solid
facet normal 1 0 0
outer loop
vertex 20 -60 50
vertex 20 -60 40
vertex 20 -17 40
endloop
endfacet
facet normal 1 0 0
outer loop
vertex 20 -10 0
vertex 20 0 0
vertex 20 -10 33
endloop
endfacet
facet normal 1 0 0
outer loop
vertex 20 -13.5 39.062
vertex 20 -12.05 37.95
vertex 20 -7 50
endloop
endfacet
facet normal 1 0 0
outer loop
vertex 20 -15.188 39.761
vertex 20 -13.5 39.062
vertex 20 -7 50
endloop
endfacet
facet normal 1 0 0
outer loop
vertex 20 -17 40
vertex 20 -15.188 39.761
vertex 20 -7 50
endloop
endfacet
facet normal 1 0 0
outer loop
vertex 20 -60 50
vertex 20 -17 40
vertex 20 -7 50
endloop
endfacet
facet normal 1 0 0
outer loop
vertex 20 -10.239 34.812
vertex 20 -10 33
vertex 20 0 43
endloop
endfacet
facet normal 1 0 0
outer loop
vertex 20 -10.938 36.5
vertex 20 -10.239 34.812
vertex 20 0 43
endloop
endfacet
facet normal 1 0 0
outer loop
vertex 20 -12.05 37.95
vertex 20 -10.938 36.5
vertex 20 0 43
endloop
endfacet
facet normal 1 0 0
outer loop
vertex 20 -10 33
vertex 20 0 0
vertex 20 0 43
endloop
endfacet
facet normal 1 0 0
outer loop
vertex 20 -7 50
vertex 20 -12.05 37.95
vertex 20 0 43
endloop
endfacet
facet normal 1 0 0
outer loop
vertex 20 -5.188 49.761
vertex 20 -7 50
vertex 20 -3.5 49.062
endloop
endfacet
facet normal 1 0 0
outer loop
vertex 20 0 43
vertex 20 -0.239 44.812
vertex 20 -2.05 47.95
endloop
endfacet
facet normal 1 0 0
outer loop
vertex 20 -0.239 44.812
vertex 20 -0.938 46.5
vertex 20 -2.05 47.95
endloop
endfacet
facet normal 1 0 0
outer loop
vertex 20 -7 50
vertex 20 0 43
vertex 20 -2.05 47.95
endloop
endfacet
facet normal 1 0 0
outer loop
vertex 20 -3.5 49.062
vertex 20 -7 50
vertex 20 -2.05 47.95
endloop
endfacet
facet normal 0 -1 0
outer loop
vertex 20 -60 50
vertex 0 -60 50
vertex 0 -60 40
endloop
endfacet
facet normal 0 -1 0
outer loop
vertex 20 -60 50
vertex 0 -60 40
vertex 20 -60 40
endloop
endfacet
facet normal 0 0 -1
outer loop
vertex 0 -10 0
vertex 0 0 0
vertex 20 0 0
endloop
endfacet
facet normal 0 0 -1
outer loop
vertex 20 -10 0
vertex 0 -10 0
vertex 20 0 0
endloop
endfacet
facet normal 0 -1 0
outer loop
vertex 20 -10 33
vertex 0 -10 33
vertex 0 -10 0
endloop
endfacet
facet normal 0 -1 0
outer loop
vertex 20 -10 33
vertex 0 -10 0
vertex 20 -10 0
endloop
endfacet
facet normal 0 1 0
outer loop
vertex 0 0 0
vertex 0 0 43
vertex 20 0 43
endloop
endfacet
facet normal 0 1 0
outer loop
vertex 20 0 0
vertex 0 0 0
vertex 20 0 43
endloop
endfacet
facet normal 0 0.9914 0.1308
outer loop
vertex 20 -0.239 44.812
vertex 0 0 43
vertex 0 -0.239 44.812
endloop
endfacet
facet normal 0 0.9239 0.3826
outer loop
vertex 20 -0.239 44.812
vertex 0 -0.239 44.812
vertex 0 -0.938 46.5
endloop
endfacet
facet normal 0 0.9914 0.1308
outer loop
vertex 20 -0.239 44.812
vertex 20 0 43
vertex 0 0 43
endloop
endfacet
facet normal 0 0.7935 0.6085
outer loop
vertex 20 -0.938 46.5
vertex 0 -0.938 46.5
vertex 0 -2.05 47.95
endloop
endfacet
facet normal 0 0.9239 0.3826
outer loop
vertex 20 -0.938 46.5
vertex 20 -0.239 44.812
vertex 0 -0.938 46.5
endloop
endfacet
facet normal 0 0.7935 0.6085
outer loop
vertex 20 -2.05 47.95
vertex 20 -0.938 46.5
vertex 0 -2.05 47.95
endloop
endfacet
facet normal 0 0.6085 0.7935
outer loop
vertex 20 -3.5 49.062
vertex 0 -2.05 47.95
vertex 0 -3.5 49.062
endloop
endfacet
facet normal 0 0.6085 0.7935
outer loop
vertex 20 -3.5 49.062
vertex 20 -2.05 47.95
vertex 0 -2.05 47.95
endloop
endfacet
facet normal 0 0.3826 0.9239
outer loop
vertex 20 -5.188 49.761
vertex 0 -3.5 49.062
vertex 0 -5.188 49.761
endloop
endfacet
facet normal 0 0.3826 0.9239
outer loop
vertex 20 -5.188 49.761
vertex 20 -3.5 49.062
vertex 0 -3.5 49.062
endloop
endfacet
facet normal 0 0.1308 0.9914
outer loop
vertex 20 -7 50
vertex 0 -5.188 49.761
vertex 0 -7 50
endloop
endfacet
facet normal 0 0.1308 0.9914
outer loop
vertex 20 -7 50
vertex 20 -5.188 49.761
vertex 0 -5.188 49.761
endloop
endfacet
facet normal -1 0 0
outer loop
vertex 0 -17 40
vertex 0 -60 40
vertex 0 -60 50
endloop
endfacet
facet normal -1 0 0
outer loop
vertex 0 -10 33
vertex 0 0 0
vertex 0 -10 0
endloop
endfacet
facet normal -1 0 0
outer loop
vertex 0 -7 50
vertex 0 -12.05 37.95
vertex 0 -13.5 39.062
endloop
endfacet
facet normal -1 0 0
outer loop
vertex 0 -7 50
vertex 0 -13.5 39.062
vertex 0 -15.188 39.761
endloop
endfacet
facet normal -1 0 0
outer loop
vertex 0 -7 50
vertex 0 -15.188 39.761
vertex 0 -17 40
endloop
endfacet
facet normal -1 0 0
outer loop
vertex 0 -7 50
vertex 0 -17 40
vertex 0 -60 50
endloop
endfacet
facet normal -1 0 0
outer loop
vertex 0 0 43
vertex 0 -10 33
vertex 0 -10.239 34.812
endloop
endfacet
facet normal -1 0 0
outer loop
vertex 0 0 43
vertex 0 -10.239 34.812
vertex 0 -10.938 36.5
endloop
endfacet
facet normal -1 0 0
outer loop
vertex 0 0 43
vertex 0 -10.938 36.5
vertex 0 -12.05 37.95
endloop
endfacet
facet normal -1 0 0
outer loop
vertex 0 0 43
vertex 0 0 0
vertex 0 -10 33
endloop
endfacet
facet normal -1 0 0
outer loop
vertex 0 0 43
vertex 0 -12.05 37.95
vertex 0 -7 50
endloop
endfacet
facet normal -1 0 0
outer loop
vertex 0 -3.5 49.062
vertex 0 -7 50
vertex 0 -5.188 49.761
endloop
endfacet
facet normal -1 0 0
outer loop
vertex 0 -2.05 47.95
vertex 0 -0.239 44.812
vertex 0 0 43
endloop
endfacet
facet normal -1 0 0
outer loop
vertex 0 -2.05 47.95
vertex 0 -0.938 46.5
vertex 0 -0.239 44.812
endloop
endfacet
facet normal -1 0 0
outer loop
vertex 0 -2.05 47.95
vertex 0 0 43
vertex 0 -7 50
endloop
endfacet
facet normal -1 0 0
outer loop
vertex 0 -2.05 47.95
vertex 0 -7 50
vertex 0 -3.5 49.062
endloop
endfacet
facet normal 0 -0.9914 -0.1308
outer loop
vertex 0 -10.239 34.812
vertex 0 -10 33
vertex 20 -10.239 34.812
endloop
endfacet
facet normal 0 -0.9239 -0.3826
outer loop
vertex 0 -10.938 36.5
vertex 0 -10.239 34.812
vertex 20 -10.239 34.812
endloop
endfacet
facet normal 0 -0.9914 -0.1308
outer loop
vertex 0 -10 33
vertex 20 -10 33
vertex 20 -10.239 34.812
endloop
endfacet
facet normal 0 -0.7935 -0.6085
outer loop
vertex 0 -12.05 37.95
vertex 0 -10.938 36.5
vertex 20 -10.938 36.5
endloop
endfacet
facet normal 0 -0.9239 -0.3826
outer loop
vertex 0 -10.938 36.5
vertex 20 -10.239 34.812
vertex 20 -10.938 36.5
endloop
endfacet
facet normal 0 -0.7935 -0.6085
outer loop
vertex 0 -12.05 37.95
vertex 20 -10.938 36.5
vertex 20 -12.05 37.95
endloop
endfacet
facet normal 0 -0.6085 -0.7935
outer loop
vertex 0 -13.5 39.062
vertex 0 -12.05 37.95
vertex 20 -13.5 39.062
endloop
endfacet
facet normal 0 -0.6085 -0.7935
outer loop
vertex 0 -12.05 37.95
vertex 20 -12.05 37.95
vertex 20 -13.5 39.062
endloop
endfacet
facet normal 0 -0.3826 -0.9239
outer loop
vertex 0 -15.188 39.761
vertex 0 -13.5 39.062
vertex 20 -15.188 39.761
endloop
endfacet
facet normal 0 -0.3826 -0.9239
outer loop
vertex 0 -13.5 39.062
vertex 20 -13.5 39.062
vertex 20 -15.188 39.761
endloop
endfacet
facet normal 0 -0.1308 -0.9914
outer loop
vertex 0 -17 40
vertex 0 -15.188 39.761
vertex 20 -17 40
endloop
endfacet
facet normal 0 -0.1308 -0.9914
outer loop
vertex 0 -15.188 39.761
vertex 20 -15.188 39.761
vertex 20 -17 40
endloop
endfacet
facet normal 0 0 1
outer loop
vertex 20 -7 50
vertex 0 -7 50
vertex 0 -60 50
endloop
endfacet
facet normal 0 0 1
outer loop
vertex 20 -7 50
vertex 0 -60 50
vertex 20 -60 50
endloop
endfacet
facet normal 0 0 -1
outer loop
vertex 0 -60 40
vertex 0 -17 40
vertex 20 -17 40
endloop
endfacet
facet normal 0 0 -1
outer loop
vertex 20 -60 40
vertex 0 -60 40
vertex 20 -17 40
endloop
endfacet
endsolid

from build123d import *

# Parameters (mm, degrees)
F0_W     = 20
F0_H     = 50
F1_DEPTH = 10
F2_W     = 20
F2_H     = 10
F3_DEPTH = 50
F4_R     = 7


with BuildPart() as f1:
    # F0 (on Front) → F1 (new body)
    with BuildSketch(Plane.XZ):
        with Locations((10, 25)):
            Rectangle(F0_W, F0_H)
    extrude(amount=F1_DEPTH)

    # F2 (on face) → F3 (join)
    with BuildSketch(Plane.XZ.offset(10)):
        with Locations((10, 45)):
            Rectangle(F2_W, F2_H)
    extrude(amount=F3_DEPTH)

    # F4
    f4_edges = [f1.edges().sort_by_distance(p)[0] for p in [
        (10, 0, 50),
        (10, -10, 40),
    ]]
    fillet(f4_edges, radius=F4_R)


solid = f1.part
